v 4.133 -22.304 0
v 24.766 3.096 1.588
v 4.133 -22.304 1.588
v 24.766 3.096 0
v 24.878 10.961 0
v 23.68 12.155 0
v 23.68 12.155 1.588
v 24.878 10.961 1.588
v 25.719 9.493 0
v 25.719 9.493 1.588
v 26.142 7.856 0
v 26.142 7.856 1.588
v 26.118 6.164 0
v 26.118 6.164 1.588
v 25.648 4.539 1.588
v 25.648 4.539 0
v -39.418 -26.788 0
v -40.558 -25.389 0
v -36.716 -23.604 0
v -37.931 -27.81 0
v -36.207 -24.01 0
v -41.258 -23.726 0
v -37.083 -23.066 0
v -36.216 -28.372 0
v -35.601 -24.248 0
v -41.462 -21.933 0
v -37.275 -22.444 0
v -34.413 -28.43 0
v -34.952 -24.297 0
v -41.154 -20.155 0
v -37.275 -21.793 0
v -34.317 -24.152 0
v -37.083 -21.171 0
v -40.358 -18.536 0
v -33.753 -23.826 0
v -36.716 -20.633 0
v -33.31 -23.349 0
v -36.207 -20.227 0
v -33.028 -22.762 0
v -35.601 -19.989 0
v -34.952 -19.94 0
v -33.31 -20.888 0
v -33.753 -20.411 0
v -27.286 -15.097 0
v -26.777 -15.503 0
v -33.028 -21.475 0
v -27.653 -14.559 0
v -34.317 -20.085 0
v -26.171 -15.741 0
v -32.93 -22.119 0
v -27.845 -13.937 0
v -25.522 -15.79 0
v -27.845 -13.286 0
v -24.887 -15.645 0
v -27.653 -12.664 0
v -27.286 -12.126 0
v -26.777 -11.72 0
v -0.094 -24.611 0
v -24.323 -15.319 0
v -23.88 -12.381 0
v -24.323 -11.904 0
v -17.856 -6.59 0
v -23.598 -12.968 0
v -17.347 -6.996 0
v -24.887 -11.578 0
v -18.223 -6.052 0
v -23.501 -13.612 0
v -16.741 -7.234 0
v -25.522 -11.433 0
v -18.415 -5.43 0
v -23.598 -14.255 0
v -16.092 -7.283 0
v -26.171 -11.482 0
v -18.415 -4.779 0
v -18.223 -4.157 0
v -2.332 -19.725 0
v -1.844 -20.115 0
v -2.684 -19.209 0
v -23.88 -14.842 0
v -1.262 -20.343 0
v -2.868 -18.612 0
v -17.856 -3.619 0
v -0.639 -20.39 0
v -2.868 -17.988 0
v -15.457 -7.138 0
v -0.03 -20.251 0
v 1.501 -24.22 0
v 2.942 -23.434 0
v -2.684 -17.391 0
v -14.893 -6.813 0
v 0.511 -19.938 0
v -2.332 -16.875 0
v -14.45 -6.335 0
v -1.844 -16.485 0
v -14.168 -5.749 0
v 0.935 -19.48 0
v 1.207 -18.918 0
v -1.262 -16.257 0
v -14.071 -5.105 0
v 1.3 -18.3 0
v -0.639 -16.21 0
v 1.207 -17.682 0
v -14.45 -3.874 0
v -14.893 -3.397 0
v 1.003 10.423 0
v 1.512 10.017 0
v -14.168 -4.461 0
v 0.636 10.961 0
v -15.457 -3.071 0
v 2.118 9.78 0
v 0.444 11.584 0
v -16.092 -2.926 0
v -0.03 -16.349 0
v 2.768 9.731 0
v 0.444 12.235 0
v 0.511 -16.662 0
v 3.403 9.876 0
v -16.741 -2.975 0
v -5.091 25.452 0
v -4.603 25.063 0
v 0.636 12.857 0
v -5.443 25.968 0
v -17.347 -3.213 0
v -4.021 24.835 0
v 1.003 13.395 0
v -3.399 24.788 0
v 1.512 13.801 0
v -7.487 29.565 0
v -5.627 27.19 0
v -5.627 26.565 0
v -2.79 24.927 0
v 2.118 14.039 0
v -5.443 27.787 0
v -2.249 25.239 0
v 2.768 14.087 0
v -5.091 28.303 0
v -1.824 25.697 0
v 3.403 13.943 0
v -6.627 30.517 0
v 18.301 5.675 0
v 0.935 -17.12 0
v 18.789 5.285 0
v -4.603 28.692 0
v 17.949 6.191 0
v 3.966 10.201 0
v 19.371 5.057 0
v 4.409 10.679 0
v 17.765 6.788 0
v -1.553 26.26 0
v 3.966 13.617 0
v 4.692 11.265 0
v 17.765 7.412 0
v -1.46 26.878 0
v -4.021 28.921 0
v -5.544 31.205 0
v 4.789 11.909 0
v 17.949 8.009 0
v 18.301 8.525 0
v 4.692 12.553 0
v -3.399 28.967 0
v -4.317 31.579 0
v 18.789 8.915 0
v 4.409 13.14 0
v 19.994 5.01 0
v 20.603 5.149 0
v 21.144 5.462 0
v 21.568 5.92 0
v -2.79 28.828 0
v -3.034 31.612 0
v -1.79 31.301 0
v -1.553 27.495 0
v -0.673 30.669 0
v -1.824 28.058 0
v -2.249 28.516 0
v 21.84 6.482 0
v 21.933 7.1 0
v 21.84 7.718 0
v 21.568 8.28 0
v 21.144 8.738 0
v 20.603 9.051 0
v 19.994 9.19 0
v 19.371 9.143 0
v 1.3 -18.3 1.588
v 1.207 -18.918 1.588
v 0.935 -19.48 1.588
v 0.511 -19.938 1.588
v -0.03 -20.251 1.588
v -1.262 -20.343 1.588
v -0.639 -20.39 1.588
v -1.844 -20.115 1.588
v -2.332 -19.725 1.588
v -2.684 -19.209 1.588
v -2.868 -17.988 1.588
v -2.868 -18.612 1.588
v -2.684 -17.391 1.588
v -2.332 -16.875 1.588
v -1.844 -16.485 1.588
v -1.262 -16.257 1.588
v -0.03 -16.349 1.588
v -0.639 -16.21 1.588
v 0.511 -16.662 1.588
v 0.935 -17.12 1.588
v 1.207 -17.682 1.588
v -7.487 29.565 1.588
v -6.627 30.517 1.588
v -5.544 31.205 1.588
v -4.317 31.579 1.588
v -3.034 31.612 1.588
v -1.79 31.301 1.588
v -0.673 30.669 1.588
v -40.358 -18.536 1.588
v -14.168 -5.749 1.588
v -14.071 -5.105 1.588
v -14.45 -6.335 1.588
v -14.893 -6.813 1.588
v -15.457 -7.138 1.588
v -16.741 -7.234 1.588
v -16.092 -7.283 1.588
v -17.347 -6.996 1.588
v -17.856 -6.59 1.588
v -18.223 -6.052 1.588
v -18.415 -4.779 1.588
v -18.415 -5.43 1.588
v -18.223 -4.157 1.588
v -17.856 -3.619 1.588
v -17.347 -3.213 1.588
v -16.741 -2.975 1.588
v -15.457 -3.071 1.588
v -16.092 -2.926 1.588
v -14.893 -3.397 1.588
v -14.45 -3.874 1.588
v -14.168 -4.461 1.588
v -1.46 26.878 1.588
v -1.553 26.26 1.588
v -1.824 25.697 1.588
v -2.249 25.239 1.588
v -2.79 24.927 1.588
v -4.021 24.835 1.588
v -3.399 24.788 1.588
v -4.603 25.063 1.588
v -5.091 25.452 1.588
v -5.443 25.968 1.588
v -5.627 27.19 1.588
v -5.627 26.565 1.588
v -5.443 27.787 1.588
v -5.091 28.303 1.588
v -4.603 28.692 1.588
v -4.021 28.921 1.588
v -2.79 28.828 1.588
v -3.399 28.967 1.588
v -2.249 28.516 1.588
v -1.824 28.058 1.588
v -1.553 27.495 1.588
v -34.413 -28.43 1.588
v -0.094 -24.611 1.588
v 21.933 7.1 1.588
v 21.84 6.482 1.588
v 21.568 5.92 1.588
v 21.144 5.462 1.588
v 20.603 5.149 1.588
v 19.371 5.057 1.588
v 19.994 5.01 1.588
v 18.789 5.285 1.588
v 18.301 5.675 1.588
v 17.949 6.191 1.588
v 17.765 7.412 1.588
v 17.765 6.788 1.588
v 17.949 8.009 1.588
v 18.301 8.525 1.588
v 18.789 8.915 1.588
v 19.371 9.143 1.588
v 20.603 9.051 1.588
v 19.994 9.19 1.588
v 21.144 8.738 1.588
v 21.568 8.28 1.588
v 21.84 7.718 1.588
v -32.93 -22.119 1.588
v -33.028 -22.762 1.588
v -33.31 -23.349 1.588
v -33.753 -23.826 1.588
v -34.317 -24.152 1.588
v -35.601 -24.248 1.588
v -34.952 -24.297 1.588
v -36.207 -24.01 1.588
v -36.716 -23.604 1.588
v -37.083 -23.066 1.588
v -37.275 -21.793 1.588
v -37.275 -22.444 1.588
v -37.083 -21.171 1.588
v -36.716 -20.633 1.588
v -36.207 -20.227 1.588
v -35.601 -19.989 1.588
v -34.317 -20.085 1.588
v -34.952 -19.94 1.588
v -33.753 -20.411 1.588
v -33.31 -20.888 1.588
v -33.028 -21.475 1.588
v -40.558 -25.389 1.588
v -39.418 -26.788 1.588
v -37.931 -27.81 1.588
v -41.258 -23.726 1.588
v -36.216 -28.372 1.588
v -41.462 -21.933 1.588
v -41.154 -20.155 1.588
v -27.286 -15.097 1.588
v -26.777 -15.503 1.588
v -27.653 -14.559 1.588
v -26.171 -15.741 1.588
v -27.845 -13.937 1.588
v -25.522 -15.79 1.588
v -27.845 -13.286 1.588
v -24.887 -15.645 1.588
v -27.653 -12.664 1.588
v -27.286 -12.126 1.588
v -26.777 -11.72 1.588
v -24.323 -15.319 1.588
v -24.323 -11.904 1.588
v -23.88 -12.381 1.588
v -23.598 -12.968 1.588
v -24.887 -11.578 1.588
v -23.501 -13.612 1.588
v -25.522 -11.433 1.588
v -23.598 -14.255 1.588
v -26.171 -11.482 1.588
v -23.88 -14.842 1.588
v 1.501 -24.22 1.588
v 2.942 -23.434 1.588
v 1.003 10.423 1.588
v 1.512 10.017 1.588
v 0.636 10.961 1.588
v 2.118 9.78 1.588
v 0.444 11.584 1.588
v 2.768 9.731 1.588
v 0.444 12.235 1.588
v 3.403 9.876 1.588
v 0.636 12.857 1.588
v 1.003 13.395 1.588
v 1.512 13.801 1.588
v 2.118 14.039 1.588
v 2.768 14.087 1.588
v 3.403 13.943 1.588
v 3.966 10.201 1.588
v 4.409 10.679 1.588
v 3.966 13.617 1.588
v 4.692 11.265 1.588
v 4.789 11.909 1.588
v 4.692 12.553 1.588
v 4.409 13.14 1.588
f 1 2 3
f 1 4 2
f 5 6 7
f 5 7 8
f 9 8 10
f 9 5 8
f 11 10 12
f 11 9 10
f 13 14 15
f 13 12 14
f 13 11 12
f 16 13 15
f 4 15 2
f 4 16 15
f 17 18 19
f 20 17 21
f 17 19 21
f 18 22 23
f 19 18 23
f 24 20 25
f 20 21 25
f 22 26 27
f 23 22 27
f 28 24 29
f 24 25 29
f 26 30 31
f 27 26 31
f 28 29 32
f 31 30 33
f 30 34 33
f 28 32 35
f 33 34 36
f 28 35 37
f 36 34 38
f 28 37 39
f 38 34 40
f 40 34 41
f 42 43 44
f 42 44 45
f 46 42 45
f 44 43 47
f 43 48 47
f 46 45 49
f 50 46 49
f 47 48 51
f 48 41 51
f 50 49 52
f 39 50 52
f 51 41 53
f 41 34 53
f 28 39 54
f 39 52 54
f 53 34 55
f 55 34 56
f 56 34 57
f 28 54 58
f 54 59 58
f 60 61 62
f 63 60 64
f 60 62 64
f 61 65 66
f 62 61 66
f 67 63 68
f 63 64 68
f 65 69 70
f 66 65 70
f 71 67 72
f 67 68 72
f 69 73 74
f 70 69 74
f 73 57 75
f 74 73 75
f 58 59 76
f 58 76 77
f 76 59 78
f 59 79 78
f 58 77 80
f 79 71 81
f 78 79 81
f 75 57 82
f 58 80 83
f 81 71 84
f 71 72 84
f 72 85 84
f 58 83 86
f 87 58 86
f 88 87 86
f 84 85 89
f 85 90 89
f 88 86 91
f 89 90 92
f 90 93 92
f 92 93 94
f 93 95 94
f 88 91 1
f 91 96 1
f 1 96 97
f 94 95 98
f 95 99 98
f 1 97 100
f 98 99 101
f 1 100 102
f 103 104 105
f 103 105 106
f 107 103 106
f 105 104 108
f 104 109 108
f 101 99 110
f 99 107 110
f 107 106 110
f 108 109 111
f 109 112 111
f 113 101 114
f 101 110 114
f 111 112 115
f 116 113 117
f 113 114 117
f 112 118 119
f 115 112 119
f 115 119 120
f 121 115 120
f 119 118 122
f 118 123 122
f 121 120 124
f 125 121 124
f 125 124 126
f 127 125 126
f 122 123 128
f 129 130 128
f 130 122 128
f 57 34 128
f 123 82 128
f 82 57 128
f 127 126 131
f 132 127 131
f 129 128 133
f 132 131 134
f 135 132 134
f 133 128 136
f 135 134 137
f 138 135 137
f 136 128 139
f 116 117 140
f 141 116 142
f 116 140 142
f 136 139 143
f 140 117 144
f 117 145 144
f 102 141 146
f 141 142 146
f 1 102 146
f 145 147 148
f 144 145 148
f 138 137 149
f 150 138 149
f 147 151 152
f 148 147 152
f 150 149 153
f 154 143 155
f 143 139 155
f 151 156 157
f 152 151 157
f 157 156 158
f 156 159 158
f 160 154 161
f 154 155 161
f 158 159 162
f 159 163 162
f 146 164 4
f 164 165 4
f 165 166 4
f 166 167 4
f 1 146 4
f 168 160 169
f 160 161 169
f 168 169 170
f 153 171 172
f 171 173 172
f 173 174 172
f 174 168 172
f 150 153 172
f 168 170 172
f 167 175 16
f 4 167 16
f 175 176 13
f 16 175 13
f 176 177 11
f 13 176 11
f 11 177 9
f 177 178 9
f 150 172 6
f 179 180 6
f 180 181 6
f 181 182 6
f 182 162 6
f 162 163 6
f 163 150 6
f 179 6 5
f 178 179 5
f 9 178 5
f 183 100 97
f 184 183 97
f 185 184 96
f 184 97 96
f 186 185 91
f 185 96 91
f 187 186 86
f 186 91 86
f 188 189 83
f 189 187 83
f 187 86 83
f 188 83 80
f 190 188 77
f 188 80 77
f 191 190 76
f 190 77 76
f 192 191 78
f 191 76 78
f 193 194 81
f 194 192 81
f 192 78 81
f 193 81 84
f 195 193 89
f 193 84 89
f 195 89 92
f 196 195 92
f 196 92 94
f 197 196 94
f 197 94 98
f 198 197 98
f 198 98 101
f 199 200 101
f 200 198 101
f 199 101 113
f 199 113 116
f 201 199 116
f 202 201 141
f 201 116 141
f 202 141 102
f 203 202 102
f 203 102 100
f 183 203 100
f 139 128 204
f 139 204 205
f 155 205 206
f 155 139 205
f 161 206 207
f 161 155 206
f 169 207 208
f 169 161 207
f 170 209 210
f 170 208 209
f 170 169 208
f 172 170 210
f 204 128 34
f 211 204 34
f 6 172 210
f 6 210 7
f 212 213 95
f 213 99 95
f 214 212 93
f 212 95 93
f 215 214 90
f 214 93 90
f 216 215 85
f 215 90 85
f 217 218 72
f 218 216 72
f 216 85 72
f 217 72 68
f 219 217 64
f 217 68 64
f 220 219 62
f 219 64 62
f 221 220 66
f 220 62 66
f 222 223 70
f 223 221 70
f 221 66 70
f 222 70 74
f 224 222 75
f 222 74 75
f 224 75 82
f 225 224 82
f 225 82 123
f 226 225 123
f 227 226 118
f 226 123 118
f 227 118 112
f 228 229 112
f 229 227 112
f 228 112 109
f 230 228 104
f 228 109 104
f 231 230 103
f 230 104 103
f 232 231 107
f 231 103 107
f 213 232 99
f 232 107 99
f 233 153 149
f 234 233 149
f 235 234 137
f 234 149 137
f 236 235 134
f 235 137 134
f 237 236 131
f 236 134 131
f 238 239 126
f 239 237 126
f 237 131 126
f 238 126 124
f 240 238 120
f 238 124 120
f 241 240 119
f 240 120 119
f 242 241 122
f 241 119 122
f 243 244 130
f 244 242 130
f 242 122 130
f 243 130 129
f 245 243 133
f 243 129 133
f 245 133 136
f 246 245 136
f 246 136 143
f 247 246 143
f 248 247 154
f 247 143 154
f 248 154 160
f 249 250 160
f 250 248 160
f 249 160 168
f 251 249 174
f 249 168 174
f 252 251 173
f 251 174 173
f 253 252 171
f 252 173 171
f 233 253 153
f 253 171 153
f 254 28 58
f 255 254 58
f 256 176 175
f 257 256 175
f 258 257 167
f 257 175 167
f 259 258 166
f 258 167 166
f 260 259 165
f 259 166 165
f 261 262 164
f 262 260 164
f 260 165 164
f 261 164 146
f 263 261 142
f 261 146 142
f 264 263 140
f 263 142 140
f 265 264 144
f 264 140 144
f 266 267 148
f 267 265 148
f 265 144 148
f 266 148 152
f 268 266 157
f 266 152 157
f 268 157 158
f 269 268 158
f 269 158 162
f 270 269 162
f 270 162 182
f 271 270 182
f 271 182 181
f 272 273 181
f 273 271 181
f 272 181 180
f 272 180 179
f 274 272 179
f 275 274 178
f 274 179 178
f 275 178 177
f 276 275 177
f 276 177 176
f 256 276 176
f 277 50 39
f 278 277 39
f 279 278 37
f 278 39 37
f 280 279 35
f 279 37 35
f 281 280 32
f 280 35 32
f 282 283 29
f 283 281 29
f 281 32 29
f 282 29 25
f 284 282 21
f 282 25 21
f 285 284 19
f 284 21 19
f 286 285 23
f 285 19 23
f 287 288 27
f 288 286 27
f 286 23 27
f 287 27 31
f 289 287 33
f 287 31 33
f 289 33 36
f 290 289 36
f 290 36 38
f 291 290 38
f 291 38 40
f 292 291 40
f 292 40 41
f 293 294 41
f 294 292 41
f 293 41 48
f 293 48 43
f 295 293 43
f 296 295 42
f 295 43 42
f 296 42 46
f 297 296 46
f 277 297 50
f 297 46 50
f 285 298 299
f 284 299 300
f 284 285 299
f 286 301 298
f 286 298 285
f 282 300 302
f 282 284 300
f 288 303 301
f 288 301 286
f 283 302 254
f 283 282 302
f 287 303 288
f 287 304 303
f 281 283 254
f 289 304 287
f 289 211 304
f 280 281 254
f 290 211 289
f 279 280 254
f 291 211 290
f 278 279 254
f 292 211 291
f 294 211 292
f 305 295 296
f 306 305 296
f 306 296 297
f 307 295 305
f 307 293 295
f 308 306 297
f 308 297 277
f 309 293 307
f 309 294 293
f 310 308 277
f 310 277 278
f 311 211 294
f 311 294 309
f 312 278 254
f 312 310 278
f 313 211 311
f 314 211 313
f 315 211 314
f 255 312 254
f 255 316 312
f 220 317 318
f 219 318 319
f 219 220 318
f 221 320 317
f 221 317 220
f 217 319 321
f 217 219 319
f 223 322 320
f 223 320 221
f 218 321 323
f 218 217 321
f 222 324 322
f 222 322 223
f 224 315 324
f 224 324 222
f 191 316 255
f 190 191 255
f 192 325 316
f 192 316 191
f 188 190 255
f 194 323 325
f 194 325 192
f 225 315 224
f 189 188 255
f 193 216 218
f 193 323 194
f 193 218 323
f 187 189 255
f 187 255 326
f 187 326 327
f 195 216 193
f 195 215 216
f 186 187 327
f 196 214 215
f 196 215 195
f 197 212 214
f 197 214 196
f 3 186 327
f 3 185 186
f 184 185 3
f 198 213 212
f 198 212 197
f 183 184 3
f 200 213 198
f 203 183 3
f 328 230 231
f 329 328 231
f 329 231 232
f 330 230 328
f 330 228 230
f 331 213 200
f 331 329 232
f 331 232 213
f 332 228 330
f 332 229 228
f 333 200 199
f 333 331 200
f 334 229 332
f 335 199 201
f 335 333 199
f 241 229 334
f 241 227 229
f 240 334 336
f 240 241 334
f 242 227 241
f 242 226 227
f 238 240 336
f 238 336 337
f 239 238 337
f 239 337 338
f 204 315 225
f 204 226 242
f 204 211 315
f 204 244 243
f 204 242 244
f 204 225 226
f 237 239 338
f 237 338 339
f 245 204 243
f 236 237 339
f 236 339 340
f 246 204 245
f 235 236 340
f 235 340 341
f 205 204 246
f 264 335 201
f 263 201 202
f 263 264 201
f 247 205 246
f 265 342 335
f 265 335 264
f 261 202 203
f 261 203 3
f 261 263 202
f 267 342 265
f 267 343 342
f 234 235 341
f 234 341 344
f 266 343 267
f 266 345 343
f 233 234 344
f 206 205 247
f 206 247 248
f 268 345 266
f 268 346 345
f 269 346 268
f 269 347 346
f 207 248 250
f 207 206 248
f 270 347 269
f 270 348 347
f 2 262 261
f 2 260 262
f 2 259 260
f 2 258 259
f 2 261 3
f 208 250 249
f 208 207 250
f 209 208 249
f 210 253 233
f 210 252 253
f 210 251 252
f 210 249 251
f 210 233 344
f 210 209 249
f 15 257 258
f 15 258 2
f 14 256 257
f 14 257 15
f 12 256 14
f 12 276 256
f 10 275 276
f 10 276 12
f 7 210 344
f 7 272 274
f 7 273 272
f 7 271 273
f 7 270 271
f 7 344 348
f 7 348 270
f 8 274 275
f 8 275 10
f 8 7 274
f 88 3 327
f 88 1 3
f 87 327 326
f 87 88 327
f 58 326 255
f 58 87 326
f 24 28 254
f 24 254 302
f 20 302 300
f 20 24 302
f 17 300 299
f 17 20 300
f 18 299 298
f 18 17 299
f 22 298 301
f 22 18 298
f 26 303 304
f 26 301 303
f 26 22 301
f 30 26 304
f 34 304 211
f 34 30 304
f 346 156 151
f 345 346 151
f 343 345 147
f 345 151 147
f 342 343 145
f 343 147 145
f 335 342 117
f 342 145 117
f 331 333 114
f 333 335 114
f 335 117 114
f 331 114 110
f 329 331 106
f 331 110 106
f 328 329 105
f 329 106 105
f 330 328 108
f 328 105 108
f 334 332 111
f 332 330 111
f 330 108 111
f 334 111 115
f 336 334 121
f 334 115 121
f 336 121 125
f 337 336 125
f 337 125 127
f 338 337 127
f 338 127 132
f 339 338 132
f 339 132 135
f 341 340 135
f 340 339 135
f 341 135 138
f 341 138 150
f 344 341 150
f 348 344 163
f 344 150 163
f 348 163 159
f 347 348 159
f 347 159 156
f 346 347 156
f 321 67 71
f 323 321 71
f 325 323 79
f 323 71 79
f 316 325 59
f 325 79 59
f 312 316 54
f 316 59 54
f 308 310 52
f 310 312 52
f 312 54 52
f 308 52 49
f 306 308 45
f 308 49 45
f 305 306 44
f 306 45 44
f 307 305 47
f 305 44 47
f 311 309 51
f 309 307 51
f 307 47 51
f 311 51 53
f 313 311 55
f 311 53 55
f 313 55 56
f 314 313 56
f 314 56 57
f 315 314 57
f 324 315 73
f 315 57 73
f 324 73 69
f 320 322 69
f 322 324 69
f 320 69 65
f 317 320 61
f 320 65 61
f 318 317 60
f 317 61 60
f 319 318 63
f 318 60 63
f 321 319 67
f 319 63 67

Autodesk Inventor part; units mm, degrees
ref_plane "YZ Plane" through (0, 0, 0) normal (1, 0, 0) x (0, 1, 0)
ref_plane "XZ Plane" through (0, 0, 0) normal (0, 1, 0) x (-1, 0, 0)
ref_plane "XY Plane" through (0, 0, 0) normal (0, 0, 1) x (1, 0, 0)
sketch "main" plane through (0, 0, 0) normal (0, 0, 1) x (1, 0, 0)
  circle A0 centre (2.6045, 11.9092) radius 2.1844
  circle A1 centre (-3.5552, 26.8777) radius 2.0955
  arc A2 (-0.6729, 30.669) -> (-7.4873, 29.5648) centre (-3.5552, 26.8777) ccw
  circle A3 centre (19.8371, 7.1) radius 2.0955
  arc A4 (24.7659, 3.0962) -> (23.6801, 12.155) centre (19.8371, 7.1) ccw
  circle A5 centre (-16.2552, -5.1047) radius 2.1844
  circle A6 centre (-0.7959, -18.3) radius 2.0955
  arc A7 (-0.0936, -24.6111) -> (4.1329, -22.3038) centre (-0.7959, -18.3) ccw
  circle A8 centre (-25.6851, -13.6116) radius 2.1844
  line L0 (-34.4127, -28.4296) -> (-0.0936, -24.6111)
  circle A9 centre (-35.1149, -22.1186) radius 2.1844
  arc A10 (-40.3577, -18.5358) -> (-34.4127, -28.4296) centre (-35.1149, -22.1186) ccw
  line L1 (-7.4873, 29.5648) -> (-40.3577, -18.5358)
  line L2 (24.7659, 3.0962) -> (4.1329, -22.3038)
  line L3 (-0.6729, 30.669) -> (23.6801, 12.155)
  point P0 (-5.4325, -4.0149)
  point P1 (-6.8254, 3.4022)
  dimension "d2" = 4.191
  dimension "d3" = 12.7
  dimension "d5" = 12.7
  dimension "d6" = 12.7
  dimension "d8" = 4.191
  dimension "d9" = 9.525
  dimension "d10" = 4.191
  dimension "d13" = 4.3688
sketch "Sketch1" plane through (0, 0, 0) normal (0, 0, 1) x (1, 0, 0)
  circle A0 centre (2.6045, 11.9092) radius 2.1844
  circle A1 centre (-3.5552, 26.8777) radius 2.0955
  arc A2 (-0.6729, 30.669) -> (-7.4873, 29.5648) centre (-3.5552, 26.8777) ccw
  circle A3 centre (19.8371, 7.1) radius 2.0955
  arc A4 (24.7659, 3.0962) -> (23.6801, 12.155) centre (19.8371, 7.1) ccw
  circle A5 centre (-16.2552, -5.1047) radius 2.1844
  circle A6 centre (-0.7959, -18.3) radius 2.0955
  arc A7 (-0.0936, -24.6111) -> (4.1329, -22.3038) centre (-0.7959, -18.3) ccw
  circle A8 centre (-25.6851, -13.6116) radius 2.1844
  line L0 (-34.4127, -28.4296) -> (-0.0936, -24.6111)
  circle A9 centre (-35.1149, -22.1186) radius 2.1844
  arc A10 (-40.3577, -18.5358) -> (-34.4127, -28.4296) centre (-35.1149, -22.1186) ccw
  line L1 (-7.4873, 29.5648) -> (-40.3577, -18.5358)
  line L2 (24.7659, 3.0962) -> (4.1329, -22.3038)
  line L3 (-0.6729, 30.669) -> (23.6801, 12.155)
  point P0 (0, 0)
extrude "Extrusion1" add sketch "Sketch1" along normal blind 1.5875
properties part number "Gearbox" material "Acetal Resin, White"
